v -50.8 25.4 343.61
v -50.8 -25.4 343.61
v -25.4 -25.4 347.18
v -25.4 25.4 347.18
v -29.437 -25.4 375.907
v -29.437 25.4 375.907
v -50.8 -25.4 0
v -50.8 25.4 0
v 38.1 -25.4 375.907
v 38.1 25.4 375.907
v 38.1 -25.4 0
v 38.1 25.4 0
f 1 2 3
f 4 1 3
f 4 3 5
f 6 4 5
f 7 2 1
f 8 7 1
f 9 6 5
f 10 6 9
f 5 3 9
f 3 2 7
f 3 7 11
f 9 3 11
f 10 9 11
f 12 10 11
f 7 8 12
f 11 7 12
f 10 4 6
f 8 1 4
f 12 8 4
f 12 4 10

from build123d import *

# Parameters (mm, degrees)
SKETCH1_W               = 101.6
SKETCH1_H               = 50.8
BOSS_EXTRUDE1_DEPTH     = 375.907215418
CUT_EXTRUDE1_DEPTH      = 383.710745346
CUT_EXTRUDE1_DEPTH_BACK = 383.710745346
CUT_EXTRUDE2_DEPTH      = 383.710745346
CUT_EXTRUDE2_DEPTH_BACK = 383.710745346
SKETCH3_W               = 12.7
SKETCH3_H               = 375.907215418


with BuildPart() as part:
    # Sketch1 → Boss-Extrude1 (new body)
    with BuildSketch(Plane.XY):
        Rectangle(SKETCH1_W, SKETCH1_H)
    extrude(amount=BOSS_EXTRUDE1_DEPTH)

    # Sketch2 → Cut-Extrude1 (cut, two sides: drawn at the far end of the back side and taken through both)
    with BuildSketch(Plane(origin=(0, 25.4, 0), x_dir=(1, 0, 0), z_dir=(0, 1, 0)).offset(-CUT_EXTRUDE1_DEPTH_BACK)):
        Polygon((-50.8, -343.610078217), (-25.4, -347.179815418), (-29.437372775, -375.907215418), (-50.8, -375.907215418), align=None)
    extrude(amount=CUT_EXTRUDE1_DEPTH + CUT_EXTRUDE1_DEPTH_BACK, mode=Mode.SUBTRACT)

    # Sketch3 → Cut-Extrude2 (cut, two sides: drawn at the far end of the back side and taken through both)
    with BuildSketch(Plane(origin=(0, 25.4, 0), x_dir=(1, 0, 0), z_dir=(0, 1, 0)).offset(-CUT_EXTRUDE2_DEPTH_BACK)):
        with Locations((44.45, -187.953607709)):
            Rectangle(SKETCH3_W, SKETCH3_H)
    extrude(amount=CUT_EXTRUDE2_DEPTH + CUT_EXTRUDE2_DEPTH_BACK, mode=Mode.SUBTRACT)


solid = part.part
